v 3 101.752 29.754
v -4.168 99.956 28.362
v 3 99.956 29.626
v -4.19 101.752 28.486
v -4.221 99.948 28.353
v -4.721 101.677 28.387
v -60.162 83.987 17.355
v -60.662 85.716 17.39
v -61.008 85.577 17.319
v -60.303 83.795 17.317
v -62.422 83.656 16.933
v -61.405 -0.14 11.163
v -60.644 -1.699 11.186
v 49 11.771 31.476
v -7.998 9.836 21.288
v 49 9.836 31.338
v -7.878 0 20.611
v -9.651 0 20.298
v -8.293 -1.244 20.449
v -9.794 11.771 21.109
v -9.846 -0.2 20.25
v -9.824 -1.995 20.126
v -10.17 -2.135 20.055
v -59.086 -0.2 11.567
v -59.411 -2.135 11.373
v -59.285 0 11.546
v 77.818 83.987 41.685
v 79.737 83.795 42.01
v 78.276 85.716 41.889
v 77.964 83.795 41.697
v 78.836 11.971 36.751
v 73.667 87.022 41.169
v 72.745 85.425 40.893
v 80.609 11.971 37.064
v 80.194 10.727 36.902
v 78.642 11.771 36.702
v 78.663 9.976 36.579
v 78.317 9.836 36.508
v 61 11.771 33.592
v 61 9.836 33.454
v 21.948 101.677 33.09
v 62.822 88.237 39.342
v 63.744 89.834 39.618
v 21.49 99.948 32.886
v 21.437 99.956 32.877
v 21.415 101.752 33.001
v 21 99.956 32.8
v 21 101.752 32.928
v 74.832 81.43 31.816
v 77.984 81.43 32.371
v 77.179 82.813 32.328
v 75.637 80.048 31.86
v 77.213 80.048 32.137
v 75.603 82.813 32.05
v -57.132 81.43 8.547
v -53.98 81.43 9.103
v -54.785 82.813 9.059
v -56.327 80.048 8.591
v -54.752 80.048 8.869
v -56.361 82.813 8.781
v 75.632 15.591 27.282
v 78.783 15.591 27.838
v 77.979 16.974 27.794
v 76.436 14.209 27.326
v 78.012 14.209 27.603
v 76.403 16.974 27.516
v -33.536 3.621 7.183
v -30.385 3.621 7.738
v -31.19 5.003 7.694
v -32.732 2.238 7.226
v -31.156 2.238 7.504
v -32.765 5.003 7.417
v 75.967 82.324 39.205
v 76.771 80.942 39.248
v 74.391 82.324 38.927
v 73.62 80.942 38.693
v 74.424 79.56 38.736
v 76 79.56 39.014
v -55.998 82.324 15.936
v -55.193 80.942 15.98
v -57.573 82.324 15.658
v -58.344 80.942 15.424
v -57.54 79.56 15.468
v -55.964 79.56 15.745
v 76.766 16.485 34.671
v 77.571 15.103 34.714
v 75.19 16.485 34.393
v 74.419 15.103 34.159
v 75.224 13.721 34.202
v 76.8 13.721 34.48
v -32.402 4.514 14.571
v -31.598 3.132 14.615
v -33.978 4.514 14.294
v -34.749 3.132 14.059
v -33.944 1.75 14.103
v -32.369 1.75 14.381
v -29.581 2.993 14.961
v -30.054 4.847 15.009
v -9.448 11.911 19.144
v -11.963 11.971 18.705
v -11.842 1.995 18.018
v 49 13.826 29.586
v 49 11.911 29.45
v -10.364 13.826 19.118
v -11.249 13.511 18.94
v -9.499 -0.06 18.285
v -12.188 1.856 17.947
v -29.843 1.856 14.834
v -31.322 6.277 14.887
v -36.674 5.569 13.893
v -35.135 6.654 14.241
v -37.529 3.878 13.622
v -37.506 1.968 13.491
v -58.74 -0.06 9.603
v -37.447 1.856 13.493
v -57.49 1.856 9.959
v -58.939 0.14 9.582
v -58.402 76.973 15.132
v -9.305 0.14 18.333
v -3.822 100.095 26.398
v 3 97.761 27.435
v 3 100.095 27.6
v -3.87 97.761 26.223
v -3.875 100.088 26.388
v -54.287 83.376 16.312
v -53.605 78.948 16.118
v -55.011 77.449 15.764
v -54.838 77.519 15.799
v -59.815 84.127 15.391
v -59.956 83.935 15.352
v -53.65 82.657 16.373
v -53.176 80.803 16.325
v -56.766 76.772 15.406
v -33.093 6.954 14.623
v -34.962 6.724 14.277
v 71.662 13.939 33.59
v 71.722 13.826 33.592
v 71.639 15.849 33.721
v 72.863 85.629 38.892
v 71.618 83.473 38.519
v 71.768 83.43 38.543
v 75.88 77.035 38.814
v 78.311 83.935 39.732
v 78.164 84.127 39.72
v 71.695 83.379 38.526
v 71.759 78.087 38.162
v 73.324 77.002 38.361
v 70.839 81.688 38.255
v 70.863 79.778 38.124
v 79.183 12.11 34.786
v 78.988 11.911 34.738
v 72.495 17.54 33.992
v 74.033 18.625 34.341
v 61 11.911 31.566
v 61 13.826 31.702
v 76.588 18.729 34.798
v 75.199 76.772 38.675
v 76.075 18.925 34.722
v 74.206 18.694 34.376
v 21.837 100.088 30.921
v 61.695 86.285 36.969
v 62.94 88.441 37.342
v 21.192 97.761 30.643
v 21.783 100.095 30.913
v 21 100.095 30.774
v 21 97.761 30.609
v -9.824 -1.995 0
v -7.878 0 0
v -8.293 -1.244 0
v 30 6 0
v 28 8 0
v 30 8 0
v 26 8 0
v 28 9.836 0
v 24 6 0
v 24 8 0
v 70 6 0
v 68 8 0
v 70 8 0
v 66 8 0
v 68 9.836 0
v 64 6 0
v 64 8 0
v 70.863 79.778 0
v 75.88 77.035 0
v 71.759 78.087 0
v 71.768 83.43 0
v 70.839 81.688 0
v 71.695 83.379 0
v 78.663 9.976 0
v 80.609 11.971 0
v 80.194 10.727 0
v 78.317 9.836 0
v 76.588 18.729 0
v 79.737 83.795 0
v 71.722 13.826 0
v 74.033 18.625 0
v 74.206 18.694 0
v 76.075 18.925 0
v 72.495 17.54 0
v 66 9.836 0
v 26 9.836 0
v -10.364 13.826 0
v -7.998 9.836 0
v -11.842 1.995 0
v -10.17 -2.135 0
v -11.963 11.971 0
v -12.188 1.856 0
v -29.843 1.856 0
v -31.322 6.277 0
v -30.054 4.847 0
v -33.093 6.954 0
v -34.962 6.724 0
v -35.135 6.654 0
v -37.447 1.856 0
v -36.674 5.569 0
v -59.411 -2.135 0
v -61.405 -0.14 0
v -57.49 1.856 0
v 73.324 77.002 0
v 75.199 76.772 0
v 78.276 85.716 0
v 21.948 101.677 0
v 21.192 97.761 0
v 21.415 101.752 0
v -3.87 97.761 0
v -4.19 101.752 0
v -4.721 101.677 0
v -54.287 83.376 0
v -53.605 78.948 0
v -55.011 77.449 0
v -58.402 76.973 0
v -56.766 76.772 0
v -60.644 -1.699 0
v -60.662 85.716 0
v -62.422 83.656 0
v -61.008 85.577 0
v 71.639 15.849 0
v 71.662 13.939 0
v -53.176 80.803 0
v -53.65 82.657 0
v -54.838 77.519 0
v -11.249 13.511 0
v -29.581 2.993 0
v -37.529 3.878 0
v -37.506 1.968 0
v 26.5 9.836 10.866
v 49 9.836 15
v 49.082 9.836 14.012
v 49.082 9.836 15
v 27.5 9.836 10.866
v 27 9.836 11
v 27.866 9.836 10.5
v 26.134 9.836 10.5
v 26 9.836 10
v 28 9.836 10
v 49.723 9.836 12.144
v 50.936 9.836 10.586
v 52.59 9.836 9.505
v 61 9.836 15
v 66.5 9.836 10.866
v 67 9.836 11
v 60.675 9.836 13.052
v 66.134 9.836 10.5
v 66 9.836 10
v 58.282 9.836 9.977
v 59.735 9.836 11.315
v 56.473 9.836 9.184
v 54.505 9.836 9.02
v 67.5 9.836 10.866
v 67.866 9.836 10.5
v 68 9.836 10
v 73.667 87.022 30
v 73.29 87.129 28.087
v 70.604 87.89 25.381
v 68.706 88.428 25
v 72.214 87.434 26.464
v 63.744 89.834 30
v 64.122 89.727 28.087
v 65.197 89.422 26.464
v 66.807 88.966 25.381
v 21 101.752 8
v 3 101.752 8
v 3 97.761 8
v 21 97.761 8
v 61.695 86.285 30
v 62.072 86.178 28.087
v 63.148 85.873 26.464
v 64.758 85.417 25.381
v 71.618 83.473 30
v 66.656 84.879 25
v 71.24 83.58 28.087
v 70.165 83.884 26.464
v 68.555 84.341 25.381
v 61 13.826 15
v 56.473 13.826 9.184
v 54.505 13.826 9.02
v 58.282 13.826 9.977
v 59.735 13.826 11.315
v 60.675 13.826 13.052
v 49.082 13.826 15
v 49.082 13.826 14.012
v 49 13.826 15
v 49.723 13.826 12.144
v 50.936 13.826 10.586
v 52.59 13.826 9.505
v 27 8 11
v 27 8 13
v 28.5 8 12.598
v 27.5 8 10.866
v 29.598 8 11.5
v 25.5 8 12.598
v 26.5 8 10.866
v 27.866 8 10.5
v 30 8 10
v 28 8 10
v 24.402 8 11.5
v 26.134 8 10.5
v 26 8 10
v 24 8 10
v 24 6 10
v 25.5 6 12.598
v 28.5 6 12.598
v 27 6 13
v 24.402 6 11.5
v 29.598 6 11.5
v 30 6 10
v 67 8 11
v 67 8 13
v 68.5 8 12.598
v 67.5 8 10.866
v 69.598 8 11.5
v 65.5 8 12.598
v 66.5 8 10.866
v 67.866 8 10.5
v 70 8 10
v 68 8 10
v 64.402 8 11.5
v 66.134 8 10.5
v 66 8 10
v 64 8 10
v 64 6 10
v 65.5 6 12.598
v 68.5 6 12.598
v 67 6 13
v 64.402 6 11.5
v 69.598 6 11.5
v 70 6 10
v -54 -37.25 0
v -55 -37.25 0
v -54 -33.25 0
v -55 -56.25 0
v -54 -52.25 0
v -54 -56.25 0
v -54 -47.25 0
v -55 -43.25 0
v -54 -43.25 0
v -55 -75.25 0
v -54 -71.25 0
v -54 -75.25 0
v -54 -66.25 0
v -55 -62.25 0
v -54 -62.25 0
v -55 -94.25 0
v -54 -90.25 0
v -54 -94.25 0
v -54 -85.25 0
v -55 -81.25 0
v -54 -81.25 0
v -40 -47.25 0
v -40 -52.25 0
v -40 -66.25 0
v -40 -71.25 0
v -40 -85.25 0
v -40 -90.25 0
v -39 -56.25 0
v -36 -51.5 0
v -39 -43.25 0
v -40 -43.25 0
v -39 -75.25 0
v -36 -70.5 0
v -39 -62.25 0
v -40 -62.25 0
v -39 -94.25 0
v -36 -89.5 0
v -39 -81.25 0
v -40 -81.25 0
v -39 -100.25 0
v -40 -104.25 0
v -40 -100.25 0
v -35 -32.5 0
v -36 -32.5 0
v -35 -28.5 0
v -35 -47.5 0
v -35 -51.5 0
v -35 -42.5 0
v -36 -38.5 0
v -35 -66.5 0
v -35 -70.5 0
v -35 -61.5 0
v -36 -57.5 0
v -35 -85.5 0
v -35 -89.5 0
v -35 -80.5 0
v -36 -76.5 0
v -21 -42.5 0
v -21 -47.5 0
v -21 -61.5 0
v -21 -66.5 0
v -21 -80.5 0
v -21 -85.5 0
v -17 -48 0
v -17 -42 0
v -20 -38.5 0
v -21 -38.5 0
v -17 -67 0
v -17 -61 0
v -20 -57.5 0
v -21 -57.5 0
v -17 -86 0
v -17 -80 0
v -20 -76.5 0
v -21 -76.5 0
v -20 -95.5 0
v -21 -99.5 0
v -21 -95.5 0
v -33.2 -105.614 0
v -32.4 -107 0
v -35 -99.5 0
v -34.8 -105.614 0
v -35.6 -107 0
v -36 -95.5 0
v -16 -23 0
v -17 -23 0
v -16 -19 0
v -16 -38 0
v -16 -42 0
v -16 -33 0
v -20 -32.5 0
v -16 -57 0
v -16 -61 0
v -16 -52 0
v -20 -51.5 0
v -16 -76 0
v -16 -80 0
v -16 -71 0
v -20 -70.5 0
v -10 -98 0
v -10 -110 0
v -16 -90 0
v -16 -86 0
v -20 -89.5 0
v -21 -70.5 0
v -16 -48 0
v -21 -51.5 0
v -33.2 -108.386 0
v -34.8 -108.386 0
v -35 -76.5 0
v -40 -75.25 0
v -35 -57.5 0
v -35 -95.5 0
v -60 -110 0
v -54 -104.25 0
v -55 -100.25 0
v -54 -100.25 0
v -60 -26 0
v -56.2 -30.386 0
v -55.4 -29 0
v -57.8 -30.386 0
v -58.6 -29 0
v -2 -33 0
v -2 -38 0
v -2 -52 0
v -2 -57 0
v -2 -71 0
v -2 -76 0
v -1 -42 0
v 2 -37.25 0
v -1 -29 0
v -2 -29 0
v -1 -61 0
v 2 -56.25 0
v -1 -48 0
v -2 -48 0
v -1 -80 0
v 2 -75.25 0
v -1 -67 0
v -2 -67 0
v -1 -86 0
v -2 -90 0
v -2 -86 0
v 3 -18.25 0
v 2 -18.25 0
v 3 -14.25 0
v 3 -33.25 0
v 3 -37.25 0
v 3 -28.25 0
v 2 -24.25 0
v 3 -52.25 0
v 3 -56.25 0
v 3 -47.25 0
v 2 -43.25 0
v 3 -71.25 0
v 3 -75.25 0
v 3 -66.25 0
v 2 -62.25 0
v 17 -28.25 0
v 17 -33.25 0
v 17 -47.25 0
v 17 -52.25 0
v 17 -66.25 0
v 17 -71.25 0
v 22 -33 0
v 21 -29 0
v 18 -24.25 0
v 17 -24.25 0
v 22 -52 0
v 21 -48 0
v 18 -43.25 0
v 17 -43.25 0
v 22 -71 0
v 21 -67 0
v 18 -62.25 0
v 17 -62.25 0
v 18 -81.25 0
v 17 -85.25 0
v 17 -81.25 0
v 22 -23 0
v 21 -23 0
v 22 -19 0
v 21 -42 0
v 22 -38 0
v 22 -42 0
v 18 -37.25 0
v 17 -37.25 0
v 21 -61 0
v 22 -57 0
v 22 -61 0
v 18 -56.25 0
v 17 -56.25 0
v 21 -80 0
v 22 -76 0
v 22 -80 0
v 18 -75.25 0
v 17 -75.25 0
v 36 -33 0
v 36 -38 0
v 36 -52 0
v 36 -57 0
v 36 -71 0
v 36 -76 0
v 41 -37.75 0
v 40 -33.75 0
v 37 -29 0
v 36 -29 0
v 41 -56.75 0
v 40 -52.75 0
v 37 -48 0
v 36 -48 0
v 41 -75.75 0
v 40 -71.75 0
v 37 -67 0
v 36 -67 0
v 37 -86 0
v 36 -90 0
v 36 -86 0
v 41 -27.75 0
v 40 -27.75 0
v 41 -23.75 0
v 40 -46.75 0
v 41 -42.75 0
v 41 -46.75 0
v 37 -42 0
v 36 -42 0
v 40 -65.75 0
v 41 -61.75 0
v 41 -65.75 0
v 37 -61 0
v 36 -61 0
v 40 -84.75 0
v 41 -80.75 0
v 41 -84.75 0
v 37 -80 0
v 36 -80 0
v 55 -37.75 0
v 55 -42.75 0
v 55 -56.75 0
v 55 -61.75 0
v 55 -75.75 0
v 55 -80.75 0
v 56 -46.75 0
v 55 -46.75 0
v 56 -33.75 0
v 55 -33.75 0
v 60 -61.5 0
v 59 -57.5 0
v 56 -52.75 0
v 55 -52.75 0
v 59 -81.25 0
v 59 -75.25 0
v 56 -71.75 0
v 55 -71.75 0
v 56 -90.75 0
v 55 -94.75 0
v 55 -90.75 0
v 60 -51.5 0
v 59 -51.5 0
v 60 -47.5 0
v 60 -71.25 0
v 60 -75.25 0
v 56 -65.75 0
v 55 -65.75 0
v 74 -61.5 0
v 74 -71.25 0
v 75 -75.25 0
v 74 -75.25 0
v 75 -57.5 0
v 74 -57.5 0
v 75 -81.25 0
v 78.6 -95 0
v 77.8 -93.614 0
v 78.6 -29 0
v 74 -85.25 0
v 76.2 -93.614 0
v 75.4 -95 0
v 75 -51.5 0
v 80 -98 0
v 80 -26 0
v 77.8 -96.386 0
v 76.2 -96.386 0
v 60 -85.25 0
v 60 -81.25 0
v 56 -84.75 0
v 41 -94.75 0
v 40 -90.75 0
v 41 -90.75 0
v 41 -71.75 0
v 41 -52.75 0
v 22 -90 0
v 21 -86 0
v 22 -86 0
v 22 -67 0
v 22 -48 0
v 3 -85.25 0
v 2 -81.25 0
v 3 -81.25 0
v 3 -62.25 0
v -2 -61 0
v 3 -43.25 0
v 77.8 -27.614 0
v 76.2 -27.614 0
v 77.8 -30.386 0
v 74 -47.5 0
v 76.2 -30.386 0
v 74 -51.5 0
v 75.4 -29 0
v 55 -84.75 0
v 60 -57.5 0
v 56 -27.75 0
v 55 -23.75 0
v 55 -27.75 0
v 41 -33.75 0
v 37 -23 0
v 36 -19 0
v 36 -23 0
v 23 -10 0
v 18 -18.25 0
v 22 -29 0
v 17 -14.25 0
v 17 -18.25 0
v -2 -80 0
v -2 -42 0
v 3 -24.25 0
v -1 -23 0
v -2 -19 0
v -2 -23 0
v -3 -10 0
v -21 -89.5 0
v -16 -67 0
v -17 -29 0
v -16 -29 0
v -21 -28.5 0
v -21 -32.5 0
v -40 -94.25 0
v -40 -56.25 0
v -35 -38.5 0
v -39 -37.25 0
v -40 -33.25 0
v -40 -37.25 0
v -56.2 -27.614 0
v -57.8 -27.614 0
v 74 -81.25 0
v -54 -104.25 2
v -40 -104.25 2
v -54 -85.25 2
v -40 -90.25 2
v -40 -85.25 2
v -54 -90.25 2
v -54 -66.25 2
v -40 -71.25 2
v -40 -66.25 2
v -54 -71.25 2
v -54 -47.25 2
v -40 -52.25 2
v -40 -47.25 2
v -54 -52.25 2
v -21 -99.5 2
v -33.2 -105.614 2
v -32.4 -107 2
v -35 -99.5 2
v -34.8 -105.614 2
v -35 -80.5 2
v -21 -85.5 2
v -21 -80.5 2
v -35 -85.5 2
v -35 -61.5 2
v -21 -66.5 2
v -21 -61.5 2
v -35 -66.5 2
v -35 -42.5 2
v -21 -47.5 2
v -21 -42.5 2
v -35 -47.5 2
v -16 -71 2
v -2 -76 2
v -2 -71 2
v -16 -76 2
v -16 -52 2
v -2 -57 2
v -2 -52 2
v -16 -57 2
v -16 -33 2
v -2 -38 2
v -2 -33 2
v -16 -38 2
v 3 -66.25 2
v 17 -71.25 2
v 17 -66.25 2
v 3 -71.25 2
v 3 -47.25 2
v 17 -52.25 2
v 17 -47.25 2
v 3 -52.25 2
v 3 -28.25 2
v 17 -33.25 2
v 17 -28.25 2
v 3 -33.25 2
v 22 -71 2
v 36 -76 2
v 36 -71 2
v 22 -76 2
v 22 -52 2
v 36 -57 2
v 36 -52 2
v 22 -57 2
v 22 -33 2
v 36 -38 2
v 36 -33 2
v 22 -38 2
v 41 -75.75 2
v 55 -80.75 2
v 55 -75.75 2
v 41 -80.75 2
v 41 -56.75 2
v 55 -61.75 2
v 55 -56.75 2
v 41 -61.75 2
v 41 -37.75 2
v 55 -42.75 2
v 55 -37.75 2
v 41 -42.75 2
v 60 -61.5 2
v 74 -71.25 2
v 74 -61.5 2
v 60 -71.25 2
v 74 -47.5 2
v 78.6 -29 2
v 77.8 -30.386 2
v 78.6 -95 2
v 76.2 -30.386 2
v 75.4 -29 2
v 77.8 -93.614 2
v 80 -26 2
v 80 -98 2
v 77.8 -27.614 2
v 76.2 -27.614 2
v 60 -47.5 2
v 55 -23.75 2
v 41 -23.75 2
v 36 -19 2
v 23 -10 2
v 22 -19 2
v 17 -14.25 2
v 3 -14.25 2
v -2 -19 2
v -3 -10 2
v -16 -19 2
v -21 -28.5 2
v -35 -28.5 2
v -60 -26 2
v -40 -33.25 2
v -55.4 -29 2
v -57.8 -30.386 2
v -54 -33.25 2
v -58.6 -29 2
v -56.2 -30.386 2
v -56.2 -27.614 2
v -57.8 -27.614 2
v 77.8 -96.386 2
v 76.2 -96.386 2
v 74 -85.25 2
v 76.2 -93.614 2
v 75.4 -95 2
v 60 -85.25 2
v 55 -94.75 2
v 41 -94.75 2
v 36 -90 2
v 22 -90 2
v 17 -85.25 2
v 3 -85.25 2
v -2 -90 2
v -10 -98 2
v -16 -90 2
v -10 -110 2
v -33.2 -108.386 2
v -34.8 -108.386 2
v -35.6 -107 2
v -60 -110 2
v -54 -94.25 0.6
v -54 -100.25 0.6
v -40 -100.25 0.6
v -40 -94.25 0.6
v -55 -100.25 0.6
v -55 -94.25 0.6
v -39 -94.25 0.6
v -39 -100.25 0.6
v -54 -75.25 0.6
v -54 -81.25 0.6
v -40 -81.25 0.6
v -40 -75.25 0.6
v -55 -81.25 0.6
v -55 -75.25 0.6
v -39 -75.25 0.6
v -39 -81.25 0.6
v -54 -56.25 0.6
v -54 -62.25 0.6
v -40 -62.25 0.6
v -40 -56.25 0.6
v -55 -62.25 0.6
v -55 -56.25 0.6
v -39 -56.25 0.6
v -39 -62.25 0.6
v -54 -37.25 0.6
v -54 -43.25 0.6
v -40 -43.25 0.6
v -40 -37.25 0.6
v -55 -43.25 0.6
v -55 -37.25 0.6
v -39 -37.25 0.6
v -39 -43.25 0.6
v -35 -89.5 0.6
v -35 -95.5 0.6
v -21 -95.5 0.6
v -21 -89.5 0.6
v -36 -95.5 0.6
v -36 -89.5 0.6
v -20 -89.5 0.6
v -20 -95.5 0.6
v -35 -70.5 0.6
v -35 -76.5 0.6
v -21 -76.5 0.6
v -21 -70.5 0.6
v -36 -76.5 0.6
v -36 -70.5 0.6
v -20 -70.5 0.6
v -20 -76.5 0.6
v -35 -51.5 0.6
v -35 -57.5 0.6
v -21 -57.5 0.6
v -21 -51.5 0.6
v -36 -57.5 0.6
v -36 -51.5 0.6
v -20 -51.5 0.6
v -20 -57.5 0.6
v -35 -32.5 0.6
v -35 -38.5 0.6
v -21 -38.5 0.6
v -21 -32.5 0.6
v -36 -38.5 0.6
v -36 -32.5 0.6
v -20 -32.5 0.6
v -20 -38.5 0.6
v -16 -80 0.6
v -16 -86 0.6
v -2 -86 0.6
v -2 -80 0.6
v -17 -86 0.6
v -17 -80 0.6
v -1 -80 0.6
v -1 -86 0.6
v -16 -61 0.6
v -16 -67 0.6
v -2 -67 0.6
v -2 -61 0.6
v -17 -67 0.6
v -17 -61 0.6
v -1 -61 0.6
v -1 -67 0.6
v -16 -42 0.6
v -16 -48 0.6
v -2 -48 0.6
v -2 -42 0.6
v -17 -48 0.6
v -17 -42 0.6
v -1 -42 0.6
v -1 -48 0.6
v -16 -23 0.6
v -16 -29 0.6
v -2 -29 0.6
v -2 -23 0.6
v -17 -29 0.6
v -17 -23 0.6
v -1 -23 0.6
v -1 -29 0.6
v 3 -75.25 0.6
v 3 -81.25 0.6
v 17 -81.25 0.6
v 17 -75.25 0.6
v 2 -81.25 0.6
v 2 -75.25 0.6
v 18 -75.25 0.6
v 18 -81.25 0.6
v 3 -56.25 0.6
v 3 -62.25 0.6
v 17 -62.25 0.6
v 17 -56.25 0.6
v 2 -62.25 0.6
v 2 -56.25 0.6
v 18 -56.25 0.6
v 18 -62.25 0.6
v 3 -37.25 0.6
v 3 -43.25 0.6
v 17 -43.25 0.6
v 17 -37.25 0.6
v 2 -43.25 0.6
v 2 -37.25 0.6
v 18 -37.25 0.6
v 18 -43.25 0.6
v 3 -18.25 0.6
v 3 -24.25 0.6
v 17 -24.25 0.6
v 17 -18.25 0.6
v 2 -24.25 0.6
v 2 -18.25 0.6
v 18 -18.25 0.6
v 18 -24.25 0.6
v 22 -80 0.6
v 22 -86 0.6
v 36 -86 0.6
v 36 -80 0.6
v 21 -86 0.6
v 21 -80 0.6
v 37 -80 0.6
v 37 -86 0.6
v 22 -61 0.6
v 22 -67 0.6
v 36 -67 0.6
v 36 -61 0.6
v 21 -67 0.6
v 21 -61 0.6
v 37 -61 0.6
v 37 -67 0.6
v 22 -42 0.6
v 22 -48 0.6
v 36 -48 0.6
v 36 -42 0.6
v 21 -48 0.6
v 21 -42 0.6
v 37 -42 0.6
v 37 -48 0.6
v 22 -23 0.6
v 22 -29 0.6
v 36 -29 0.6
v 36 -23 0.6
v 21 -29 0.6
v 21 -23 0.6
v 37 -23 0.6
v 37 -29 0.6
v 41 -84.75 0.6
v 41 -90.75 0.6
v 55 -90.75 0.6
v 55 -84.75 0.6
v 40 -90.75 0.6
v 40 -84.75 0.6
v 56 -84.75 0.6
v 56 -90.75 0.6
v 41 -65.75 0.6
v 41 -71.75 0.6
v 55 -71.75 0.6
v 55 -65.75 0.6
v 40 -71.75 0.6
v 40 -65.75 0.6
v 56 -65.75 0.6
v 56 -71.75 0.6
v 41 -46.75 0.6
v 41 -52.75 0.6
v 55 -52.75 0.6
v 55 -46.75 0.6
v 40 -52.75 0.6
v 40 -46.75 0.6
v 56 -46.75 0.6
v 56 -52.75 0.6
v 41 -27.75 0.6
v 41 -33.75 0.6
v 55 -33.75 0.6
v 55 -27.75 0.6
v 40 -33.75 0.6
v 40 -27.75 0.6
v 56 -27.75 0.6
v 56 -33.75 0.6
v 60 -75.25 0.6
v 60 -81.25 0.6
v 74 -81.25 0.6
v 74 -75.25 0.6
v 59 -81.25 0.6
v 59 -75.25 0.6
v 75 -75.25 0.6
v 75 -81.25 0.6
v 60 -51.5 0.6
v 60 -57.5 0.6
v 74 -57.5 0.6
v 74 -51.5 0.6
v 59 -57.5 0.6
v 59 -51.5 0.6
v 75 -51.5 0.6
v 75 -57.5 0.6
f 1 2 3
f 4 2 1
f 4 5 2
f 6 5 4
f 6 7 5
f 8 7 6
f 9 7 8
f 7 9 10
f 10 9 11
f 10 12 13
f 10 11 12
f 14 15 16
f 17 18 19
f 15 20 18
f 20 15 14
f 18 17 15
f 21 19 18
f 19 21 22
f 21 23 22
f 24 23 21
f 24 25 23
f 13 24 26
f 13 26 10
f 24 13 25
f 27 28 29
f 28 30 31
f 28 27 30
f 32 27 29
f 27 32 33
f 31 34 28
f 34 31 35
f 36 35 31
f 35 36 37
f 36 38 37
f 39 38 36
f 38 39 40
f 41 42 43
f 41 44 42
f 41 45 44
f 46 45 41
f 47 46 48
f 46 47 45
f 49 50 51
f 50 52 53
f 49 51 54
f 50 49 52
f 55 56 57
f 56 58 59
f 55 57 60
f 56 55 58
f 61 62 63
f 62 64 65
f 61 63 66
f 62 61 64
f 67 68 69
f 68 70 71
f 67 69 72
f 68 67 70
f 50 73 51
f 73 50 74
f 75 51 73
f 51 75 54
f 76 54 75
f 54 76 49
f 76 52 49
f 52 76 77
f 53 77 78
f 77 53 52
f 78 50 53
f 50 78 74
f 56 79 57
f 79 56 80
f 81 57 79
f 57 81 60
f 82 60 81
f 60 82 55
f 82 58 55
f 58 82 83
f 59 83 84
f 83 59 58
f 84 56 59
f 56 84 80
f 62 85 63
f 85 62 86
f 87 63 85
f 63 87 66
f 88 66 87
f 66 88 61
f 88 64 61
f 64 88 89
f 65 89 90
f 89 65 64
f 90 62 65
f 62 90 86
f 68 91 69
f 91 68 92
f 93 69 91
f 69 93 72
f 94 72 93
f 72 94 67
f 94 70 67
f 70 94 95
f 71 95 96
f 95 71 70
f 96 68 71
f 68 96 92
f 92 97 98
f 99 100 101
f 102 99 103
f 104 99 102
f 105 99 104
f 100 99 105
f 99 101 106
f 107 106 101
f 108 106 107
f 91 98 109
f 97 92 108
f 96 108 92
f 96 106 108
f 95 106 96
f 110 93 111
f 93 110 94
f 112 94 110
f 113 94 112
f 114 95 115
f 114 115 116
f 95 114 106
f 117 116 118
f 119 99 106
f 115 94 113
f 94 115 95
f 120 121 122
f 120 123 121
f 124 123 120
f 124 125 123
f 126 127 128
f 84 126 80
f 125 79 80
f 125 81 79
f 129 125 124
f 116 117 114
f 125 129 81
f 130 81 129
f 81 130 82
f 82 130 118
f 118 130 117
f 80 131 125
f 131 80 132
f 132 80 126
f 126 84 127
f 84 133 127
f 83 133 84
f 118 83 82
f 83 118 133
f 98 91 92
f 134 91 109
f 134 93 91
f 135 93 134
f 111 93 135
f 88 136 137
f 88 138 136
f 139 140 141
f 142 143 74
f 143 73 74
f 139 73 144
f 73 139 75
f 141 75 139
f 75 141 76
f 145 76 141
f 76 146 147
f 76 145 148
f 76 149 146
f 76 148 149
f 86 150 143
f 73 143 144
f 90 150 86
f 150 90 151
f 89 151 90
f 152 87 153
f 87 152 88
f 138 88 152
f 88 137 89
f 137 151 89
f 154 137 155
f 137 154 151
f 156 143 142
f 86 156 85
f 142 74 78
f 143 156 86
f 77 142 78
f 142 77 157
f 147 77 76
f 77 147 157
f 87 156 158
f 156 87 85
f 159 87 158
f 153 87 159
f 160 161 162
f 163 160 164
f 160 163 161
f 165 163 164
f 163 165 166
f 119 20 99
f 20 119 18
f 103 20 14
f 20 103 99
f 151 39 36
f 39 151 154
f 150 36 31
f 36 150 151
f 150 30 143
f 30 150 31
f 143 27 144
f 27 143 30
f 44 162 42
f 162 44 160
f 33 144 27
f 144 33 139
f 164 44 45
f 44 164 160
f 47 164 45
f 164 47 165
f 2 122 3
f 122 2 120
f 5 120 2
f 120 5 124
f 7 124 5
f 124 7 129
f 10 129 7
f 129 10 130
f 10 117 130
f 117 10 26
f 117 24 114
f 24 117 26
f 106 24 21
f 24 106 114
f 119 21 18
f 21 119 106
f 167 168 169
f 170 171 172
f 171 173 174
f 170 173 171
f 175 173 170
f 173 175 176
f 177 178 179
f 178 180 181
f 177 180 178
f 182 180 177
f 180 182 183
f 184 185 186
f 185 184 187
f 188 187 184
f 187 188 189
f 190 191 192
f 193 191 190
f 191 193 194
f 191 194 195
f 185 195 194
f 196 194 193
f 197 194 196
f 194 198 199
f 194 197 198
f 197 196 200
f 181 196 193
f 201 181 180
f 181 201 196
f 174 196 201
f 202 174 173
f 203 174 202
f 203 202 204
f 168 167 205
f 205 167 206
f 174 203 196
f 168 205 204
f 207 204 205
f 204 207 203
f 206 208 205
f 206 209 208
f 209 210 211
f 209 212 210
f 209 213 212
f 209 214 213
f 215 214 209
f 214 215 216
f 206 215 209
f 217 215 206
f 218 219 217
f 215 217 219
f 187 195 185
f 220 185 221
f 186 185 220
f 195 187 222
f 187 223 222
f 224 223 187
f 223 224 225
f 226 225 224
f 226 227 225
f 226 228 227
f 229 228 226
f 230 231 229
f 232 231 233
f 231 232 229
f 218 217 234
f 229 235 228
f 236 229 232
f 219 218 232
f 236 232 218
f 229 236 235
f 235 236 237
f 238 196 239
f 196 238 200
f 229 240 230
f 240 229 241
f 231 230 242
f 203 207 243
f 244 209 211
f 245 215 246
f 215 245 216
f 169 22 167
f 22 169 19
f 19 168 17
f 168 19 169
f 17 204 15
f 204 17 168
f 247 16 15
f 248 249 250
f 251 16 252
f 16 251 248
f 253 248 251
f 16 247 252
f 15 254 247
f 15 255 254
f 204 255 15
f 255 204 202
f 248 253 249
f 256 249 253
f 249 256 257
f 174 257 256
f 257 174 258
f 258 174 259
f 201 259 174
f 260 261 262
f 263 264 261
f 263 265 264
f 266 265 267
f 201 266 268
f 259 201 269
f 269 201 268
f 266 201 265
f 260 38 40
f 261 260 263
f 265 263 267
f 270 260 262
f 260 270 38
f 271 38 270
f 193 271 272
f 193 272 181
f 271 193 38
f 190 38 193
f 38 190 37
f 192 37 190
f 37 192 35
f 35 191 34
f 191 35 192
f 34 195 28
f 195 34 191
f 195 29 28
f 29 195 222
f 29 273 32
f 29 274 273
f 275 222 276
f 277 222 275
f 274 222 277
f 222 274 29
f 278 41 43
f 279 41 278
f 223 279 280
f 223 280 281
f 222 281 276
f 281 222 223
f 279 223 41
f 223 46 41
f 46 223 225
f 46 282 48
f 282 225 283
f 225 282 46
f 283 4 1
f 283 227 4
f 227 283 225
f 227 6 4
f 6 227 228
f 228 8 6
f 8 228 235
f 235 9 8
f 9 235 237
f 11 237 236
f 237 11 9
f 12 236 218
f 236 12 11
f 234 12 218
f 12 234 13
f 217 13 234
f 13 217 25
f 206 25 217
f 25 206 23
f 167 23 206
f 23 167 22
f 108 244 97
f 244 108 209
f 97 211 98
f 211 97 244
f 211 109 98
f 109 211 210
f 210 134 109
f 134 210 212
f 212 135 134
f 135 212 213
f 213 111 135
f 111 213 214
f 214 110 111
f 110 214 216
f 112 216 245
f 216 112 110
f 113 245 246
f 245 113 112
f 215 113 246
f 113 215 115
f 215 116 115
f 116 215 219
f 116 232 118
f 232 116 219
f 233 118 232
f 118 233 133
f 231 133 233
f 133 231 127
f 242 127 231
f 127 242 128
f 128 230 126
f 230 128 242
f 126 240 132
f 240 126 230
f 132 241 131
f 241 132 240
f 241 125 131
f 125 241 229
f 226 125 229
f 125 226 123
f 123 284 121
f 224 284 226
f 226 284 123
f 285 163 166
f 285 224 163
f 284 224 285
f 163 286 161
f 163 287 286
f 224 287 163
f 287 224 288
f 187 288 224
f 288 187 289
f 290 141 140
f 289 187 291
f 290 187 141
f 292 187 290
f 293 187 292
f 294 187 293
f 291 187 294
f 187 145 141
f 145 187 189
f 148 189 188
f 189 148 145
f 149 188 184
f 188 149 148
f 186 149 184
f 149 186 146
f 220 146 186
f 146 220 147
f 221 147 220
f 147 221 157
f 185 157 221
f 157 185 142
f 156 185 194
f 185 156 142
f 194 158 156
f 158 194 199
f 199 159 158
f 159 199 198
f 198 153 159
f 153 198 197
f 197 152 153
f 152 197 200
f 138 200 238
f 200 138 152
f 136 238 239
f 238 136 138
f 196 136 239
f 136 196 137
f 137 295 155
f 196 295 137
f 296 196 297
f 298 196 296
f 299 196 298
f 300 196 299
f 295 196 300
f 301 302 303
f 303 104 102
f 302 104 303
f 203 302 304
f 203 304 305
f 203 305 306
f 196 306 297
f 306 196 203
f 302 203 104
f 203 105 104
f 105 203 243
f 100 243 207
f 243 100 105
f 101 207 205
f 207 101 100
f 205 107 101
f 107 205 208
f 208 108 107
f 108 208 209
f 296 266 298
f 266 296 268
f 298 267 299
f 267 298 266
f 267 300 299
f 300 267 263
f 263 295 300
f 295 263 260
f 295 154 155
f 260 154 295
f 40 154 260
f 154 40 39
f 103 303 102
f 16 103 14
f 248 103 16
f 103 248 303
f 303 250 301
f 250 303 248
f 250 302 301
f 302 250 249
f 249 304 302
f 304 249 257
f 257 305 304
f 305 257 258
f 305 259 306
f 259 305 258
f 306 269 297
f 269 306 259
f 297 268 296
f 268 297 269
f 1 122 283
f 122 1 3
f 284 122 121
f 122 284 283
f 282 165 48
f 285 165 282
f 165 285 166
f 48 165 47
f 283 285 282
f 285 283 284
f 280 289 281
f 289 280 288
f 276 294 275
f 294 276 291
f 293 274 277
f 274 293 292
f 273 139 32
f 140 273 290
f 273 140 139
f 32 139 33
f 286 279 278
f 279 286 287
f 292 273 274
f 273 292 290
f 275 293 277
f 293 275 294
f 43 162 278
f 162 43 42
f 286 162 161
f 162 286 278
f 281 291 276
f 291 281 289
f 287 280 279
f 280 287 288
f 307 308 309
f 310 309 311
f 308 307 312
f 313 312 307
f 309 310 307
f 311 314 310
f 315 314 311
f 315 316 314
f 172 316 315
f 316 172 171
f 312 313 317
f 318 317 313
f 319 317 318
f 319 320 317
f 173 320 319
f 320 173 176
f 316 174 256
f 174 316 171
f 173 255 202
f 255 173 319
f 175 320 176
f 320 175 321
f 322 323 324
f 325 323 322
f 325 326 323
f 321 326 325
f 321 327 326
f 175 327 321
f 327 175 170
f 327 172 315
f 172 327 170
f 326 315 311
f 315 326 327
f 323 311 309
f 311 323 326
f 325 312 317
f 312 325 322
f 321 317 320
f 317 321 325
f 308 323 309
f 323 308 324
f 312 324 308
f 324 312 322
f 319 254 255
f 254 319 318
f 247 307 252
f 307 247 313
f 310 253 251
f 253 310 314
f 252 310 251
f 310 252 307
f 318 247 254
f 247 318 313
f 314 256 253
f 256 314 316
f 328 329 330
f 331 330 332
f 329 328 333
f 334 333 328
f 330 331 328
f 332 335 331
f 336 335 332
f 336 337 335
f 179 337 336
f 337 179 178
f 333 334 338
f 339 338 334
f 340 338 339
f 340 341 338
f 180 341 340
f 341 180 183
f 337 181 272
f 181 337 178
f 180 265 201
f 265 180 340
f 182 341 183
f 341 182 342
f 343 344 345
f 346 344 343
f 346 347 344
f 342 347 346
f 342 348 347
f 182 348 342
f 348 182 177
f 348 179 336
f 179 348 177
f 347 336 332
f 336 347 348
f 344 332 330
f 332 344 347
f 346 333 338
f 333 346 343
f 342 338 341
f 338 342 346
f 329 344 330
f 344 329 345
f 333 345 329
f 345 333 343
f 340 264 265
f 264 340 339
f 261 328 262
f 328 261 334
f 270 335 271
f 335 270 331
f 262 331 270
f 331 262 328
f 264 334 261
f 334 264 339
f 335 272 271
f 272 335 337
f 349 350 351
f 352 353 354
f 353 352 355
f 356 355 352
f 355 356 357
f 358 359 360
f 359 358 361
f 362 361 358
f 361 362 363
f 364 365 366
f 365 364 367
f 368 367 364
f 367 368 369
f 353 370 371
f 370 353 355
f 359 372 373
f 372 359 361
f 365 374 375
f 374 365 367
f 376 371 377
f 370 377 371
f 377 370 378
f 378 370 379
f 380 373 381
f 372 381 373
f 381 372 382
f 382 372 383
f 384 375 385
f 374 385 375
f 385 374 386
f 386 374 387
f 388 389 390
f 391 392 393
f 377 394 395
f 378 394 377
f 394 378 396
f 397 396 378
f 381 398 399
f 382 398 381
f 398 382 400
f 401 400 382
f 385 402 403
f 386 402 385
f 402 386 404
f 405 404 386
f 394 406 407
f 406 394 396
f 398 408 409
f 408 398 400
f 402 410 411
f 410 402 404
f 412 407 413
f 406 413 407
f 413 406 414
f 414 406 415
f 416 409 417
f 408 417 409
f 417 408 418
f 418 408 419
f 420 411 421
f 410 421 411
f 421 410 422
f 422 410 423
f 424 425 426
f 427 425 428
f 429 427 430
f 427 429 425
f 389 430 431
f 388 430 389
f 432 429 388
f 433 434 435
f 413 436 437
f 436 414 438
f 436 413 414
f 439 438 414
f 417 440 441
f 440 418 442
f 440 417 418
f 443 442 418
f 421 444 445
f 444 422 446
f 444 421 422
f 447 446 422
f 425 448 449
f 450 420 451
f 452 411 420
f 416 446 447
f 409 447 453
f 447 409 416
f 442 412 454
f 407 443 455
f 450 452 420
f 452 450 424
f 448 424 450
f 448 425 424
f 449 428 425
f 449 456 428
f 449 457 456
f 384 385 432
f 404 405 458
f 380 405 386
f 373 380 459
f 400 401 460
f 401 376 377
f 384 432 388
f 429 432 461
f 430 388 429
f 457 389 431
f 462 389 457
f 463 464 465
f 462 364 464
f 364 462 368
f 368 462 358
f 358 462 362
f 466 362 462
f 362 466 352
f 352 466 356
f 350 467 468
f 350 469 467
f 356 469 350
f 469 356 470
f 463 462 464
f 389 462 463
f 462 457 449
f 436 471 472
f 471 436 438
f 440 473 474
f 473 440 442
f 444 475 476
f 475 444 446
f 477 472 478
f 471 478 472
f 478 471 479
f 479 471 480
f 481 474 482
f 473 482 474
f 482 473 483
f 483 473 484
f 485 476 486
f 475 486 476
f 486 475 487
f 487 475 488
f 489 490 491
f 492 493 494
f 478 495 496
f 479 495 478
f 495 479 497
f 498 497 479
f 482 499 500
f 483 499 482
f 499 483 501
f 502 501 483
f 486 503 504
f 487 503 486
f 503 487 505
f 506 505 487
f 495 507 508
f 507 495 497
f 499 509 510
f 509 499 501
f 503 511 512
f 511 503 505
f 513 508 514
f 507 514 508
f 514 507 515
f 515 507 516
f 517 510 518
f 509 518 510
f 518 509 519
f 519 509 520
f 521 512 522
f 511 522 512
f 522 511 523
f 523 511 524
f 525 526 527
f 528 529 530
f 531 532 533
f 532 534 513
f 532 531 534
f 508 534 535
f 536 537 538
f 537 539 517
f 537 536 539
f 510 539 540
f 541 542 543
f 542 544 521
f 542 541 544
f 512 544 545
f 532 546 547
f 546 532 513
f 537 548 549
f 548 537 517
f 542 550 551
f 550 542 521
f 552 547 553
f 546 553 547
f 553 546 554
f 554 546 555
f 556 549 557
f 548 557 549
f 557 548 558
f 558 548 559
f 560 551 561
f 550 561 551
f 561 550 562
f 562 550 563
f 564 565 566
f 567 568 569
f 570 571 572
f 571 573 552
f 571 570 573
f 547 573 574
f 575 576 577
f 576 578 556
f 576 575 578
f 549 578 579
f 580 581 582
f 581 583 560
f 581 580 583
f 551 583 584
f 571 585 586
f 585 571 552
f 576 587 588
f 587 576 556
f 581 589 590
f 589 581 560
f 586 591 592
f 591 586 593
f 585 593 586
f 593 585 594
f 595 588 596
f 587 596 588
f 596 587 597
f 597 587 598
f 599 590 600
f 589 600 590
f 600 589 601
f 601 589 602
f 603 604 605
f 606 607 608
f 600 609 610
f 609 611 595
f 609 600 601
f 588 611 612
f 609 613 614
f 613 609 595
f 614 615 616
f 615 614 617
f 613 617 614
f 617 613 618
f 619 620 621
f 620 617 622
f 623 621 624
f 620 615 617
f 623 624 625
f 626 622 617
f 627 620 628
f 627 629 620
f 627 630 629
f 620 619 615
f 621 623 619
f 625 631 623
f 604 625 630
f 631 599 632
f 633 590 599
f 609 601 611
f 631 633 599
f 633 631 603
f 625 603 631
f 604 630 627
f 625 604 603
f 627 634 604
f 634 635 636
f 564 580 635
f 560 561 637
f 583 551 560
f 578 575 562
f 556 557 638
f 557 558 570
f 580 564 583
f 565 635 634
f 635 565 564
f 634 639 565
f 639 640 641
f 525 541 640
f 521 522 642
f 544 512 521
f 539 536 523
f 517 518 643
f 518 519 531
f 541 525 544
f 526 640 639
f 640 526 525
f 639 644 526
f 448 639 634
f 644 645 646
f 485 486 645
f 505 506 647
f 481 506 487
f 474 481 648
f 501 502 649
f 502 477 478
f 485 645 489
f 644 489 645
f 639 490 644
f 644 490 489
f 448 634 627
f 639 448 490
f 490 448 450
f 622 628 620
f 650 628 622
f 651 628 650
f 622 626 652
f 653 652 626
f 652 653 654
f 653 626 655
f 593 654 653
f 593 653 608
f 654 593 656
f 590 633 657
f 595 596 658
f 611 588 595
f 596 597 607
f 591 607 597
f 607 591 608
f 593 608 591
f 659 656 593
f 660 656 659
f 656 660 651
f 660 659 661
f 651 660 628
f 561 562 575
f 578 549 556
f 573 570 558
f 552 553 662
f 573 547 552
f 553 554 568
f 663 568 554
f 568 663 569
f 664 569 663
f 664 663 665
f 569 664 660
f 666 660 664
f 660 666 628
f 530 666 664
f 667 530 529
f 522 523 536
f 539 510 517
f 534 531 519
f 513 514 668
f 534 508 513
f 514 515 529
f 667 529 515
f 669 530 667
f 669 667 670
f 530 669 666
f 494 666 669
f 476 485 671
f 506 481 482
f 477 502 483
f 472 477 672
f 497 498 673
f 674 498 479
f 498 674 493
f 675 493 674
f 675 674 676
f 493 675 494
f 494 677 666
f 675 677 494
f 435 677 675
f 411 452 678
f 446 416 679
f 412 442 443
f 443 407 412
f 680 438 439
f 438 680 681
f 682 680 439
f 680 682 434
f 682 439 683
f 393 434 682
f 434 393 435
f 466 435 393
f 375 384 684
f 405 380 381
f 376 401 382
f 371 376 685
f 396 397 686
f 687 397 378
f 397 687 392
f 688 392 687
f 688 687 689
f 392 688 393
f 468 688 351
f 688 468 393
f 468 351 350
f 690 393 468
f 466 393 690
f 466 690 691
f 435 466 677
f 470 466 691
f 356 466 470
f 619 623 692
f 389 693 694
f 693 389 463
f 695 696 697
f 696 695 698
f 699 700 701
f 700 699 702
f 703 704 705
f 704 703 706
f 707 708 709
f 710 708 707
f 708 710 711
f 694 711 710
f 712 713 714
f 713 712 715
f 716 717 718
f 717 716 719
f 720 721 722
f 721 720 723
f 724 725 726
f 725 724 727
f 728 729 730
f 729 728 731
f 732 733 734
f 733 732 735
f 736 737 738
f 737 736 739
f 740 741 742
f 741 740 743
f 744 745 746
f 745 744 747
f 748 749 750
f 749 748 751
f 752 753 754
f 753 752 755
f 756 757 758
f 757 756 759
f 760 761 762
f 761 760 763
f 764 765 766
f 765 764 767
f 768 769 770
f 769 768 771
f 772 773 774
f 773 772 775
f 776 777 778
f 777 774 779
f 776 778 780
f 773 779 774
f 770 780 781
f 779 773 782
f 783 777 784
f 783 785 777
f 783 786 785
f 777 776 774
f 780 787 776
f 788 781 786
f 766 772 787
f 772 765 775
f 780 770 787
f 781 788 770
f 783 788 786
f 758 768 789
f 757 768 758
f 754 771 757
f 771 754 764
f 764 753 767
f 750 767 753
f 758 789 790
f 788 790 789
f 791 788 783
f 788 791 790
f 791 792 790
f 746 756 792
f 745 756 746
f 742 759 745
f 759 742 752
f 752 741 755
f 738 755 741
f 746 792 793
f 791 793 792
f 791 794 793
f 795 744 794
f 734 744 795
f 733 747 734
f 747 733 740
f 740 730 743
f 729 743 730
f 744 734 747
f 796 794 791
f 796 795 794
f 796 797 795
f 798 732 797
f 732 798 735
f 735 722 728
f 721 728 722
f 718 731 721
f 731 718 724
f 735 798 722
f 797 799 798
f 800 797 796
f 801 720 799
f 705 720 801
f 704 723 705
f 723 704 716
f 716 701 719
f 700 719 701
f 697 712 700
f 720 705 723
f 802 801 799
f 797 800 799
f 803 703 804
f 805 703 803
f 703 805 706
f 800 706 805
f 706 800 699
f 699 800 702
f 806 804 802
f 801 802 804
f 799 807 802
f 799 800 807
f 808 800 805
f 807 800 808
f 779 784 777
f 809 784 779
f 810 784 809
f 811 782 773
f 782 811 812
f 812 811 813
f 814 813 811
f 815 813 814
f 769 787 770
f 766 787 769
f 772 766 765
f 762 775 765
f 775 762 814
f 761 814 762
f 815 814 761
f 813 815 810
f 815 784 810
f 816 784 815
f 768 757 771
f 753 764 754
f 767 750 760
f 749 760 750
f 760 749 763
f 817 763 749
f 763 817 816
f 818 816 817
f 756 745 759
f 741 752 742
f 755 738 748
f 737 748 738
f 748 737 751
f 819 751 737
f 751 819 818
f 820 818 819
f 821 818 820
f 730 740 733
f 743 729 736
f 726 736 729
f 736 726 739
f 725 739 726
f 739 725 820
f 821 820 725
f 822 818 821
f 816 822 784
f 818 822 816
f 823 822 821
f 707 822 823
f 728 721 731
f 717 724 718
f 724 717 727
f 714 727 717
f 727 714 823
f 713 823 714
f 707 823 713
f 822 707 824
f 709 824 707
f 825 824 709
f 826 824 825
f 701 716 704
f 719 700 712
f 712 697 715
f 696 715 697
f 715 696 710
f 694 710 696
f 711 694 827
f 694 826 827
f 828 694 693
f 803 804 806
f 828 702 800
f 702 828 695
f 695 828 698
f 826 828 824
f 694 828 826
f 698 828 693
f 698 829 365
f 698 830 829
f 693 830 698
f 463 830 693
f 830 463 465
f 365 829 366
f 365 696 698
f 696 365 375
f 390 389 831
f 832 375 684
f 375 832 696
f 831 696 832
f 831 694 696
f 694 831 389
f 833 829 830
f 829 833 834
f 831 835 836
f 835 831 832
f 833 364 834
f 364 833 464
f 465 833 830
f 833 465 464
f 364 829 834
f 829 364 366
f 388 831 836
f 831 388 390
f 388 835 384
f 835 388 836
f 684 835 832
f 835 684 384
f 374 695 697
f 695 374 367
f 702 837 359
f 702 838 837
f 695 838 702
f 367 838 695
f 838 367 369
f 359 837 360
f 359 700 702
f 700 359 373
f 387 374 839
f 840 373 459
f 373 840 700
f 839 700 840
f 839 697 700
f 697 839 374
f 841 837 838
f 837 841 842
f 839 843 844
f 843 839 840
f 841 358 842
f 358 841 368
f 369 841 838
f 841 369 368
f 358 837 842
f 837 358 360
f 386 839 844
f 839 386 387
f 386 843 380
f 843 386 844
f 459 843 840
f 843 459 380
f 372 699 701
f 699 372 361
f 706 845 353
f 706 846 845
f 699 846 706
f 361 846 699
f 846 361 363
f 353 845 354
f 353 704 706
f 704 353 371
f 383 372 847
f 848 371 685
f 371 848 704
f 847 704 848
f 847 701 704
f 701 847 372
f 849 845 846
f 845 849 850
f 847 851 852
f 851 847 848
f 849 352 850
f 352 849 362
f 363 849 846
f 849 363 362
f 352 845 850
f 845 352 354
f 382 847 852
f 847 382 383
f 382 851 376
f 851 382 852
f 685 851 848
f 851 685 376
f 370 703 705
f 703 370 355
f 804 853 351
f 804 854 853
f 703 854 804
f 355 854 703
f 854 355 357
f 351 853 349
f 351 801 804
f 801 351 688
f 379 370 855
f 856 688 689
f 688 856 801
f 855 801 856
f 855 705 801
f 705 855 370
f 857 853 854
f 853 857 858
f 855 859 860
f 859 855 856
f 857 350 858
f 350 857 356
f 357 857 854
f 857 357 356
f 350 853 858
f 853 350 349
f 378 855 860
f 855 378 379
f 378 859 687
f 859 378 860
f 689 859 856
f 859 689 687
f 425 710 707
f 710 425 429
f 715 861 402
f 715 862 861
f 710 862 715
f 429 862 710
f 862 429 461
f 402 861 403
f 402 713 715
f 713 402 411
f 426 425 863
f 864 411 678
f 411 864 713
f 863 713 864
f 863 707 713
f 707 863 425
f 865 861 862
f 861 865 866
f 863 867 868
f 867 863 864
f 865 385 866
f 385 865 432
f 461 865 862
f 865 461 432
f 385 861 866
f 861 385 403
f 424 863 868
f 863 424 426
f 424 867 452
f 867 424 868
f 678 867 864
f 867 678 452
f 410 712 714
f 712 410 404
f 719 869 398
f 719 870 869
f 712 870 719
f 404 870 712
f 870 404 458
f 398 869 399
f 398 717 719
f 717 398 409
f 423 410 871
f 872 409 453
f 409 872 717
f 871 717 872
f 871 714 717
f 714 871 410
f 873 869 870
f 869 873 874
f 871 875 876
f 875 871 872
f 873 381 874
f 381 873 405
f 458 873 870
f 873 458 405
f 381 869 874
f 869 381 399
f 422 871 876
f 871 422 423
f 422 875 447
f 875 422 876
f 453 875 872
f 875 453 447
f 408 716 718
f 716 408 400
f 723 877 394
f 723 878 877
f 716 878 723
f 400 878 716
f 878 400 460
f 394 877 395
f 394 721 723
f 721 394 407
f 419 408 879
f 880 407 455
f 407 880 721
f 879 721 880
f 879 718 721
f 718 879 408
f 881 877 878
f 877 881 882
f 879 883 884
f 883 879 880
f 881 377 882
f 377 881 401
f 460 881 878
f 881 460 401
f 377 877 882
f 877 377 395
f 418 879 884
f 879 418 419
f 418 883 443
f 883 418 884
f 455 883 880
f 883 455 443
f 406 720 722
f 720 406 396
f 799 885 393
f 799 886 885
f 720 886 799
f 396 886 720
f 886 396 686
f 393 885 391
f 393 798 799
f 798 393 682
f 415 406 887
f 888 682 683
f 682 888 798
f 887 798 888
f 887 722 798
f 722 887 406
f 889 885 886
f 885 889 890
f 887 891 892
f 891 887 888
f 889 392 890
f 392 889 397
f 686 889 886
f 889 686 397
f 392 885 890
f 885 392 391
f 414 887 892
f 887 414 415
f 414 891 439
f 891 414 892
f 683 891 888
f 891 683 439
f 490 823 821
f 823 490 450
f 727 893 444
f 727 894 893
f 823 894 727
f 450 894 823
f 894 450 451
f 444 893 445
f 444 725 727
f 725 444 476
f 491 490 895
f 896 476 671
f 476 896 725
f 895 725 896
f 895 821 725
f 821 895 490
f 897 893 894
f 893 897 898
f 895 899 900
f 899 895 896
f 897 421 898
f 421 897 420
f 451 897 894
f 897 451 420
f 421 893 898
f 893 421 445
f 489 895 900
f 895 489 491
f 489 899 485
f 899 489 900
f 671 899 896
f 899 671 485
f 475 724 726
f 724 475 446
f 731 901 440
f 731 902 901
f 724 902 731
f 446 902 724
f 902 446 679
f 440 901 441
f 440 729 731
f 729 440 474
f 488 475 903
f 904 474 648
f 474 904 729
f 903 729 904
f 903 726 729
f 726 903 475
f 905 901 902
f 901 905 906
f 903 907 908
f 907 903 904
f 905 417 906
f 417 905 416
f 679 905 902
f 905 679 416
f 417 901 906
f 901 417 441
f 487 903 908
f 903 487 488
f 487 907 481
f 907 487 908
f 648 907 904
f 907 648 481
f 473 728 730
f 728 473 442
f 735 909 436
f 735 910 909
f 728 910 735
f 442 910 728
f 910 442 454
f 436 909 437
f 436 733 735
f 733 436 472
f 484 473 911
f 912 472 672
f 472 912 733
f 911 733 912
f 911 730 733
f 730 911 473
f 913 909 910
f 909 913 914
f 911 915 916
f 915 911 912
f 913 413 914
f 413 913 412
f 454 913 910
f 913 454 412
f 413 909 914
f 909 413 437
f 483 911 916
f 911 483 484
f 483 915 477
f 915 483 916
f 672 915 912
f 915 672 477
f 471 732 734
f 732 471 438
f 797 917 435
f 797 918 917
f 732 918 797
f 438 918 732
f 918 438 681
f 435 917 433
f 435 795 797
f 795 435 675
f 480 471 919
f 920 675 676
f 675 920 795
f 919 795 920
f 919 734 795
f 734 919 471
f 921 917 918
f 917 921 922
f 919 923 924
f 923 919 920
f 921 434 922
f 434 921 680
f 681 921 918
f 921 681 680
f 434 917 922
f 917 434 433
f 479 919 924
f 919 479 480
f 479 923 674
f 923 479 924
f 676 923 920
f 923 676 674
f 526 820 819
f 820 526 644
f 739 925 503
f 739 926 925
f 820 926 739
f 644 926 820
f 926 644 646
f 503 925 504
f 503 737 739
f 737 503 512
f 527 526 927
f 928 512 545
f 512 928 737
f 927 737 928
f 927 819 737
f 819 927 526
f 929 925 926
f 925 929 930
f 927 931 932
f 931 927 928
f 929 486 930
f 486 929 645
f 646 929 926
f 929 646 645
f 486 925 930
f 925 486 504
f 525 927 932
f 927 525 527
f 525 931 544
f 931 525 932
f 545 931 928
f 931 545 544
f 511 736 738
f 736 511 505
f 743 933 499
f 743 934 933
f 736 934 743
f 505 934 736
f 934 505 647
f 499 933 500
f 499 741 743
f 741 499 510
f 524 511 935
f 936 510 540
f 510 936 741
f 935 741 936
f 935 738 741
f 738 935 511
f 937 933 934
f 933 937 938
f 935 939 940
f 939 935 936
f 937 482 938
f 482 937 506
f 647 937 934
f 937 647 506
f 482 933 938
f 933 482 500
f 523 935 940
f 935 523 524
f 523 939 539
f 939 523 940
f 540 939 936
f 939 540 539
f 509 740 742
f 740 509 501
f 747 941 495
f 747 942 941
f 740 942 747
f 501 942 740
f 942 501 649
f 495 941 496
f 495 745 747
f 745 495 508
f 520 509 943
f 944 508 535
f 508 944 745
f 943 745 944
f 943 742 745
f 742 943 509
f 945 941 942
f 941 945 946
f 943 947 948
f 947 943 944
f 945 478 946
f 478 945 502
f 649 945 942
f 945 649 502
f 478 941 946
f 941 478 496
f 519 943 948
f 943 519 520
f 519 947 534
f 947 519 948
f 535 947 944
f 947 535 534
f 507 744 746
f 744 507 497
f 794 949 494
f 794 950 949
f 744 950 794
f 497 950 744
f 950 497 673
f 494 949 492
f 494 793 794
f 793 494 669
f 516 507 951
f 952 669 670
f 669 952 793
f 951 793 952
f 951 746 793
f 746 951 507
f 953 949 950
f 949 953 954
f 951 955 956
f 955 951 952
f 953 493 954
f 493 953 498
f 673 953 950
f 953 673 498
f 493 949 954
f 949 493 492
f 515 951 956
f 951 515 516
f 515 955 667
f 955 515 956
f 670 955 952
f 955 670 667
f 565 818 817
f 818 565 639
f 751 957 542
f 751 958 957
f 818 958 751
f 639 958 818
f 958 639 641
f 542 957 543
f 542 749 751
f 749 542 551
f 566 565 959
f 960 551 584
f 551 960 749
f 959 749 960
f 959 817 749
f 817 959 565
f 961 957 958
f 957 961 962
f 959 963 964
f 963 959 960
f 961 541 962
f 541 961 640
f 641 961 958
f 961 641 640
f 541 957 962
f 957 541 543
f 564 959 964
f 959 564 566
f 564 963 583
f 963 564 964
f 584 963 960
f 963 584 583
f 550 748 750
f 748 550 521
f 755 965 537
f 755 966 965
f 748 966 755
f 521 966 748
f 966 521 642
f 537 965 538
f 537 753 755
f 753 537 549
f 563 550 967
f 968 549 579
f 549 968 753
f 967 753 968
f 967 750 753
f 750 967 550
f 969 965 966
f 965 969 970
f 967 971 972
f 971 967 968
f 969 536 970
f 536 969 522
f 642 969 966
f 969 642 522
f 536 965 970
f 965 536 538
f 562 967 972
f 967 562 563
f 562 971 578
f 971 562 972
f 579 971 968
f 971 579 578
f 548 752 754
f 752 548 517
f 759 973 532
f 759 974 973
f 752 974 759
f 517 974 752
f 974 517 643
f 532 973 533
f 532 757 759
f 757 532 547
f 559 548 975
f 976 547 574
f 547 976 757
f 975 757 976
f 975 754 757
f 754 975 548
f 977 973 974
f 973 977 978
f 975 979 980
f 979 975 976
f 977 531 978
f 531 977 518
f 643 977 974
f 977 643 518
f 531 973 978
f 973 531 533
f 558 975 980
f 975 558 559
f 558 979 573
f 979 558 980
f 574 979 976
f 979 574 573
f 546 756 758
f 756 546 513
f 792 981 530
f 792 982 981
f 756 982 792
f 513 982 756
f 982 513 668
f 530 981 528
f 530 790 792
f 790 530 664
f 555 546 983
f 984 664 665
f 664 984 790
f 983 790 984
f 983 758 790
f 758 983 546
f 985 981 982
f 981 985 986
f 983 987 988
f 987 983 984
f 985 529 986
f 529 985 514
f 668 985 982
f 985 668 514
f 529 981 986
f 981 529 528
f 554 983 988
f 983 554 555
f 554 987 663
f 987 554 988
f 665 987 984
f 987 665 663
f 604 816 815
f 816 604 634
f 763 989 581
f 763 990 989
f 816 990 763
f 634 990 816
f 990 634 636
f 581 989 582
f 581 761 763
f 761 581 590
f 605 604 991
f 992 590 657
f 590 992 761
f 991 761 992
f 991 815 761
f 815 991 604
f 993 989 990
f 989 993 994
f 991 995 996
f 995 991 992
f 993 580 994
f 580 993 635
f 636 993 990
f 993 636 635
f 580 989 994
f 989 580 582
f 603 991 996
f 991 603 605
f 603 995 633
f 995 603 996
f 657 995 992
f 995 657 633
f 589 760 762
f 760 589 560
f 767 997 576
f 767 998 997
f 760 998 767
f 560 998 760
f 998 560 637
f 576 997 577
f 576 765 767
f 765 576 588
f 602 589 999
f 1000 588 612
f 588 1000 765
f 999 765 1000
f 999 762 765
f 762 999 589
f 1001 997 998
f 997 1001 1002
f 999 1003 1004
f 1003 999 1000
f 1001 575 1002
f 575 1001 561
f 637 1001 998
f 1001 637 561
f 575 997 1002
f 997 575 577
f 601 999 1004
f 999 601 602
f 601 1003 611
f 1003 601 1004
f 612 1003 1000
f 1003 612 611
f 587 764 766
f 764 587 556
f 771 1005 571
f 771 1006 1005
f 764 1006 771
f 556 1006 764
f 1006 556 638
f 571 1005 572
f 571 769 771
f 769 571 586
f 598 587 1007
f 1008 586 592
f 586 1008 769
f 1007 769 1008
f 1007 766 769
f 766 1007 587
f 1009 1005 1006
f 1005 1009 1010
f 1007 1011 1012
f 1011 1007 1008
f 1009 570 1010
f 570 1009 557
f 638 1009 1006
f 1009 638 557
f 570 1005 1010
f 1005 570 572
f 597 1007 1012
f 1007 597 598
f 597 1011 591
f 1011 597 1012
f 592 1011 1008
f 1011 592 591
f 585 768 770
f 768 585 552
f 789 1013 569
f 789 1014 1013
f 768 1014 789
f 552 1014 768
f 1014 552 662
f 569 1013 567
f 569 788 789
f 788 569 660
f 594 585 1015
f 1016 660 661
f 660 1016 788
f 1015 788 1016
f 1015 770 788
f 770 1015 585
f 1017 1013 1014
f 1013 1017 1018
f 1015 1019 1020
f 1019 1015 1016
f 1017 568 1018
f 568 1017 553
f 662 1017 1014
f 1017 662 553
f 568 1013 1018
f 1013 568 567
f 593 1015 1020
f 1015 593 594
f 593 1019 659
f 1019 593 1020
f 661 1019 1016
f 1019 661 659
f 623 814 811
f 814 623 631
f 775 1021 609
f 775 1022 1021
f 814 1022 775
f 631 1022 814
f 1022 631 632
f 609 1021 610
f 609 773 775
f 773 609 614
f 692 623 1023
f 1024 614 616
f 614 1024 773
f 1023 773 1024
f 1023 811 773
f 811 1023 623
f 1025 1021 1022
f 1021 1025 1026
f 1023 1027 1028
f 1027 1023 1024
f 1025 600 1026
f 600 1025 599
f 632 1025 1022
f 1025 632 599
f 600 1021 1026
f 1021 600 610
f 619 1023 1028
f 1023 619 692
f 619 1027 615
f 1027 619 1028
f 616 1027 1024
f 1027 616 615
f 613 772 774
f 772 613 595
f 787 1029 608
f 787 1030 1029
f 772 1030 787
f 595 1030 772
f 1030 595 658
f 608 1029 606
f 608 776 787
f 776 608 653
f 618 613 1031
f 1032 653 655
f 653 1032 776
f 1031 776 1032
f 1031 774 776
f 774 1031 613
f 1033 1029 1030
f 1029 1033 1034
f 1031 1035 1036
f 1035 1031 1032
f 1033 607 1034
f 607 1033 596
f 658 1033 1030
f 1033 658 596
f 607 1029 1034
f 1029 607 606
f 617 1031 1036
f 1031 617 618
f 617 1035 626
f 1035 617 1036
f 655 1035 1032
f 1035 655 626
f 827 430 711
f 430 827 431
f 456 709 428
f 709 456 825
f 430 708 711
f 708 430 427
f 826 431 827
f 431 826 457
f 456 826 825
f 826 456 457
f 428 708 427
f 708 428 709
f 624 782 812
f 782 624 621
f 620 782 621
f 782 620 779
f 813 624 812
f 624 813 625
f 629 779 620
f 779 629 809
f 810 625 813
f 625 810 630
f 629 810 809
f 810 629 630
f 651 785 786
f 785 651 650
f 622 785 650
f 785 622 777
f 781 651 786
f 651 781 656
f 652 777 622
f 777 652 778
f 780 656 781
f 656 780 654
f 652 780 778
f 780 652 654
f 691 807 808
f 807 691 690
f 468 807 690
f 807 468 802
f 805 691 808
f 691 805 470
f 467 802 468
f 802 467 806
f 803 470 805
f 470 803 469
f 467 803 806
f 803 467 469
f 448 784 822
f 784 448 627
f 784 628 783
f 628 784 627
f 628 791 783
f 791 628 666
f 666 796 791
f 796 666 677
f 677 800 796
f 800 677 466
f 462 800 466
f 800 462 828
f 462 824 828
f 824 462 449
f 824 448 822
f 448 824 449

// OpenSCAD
// file: common.scad
module keyswitch_hole(x=0, y=0, a=0) {
    translate([x, y, 0]) {
        rotate([0, 0, 90+a]) {
            linear_extrude(height = 2) {
            square([14, 14], center = true);
            //translate([-8, 3, 0]) square([1, 3]);
            //translate([-8, -6, 0]) square([1, 3]);
            //translate([7, 3, 0]) square([1, 3]);
            //translate([7, -6, 0]) square([1, 3]);
            }
            linear_extrude(height = 0.6) {
                translate([-3, 7]) square([6, 1]);
            translate([-3, -8]) square([6, 1]);
            }
        }
    }
}

keyswitch_hole();

module joint_male_face() {
    translate([-1, 0])
    square([2,4]);
    translate([-3, 2])
    square([6,2]);
}

module joint_male(pos=[0,0]) {
    translate(pos){
      rotate([0,0,180]){
        linear_extrude(height=10)
        joint_male_face();
        
        translate([0,2,10])
        rotate([-90,0,0])
        linear_extrude(height=2)
        circle(3, $fn=12);
        
        translate([0,0,10])
        rotate([-90,0,0])
        linear_extrude(height=2)
        circle(1, $fn=12);
      }
    }
}

module joint_female(pos=[0,0]) {
    delta = 0.6;
    translate(pos){
      rotate([0,0,180]){
        linear_extrude(height=10)
        offset(delta=delta)
        joint_male_face();
        
        translate([0,1.6,10])
        rotate([-90,0,0])
        linear_extrude(height=2.8)
        offset(delta=delta)
        circle(3, $fn=12);

        translate([0,-0.4,10])
        rotate([-90,0,0])
        linear_extrude(height=2.8)
        offset(delta=delta)
        circle(1, $fn=12);
      }
    }
}


joint_male([20, 0]);
joint_female([30, 0]);
// main file
use <common.scad>;

UNIT = 19;
UNIT_H = UNIT / 2;
UNIT_Q = UNIT / 4;
UNIT_E = UNIT / 8;

KEY_OFFSET_X = 10;
KEY_OFFSET_Y = 8;

finger_plate_points = [
    [-60,0],
    [-10,0],
    [-10,12],
    [80, 12],
    [80, 84],
    [23, 100],
    [-3, 100],
    [-60, 84],
];

finger_plate_sc_points = [
    [-34, 3],
    [80-3, 12+3],
    [80-3, 84 - 3],
    [-60+3, 84 - 3],
];

module finger_plate_nohole() {
    linear_extrude(height = 2)
    polygon(points=finger_plate_points);
}

module keyswitch_col(x=0,y=0,c=3,a=0) {
    rotate([0, 0, a])
    for (i = [0:c-1]) {
        keyswitch_hole(x, y+19*i);
    }
}

module finger_plate_holes() {
    // G
    GX = KEY_OFFSET_X - UNIT * 3;
    GY = KEY_OFFSET_Y + UNIT_Q;
    echo("G: ", GX, GY);
    keyswitch_col(GX, GY, 4);
    // F
    FX = KEY_OFFSET_X- UNIT * 2;
    FY = KEY_OFFSET_Y + UNIT_H;
    echo("F: ", FX, FY);
    keyswitch_col(FX, FY, 4);
    // E
    EX = KEY_OFFSET_X - UNIT;
    EY = KEY_OFFSET_Y + UNIT_H + UNIT_Q + UNIT_Q;
    echo("E: ", EX, EY);
    keyswitch_col(EX, EY, 4);
    // D
    DX = KEY_OFFSET_X;
    DY = KEY_OFFSET_Y + UNIT + UNIT_Q;
    echo("D: ", DX, DY);
    keyswitch_col(DX, DY, 4);
    // C
    CX = KEY_OFFSET_X+ UNIT;
    CY = KEY_OFFSET_Y + UNIT;
    echo("C: ", CX, CY);
    keyswitch_col(CX, CY, 4);
    // B
    BX = KEY_OFFSET_X+UNIT * 2;
    BY = KEY_OFFSET_Y+ UNIT_H + UNIT_Q;
    echo("B: ", BX, BY);
    keyswitch_col(BX, BY, 4);
    // A
    AX = KEY_OFFSET_X+UNIT*3;
    AY = KEY_OFFSET_Y+UNIT + UNIT_Q;
    echo("A: ", AX, AY);
    keyswitch_col(AX, AY, 1);
    echo("A2: ", AX, AY + UNIT + UNIT_Q);
    keyswitch_col(AX, AY + UNIT + UNIT_Q, 1);  
    for(p=finger_plate_sc_points){
        linear_extrude(height=5)
            translate(p)
            circle(1.6);
    }
}

module finger_plate() {
    difference() {
        finger_plate_nohole();
        finger_plate_holes();
    }
}

//tilt_angle = [-5,-5,0];
tilt_angle = [4,-10,0];
tilt_angle_r = tilt_angle * -1;
echo(tilt_angle_r);

//height = 15;
height = 22;

module finger_case_outer_face() {
    projection()
        translate([0,0,height])
        rotate(tilt_angle)
        linear_extrude(height=2)
        offset(2)
        polygon(points=finger_plate_points);
}

module finger_case_inner_face() {
    projection()
        translate([0,0,height])
        rotate(tilt_angle)
        linear_extrude(height=2)
        offset(-2)
        polygon(points=finger_plate_points);
}

module finger_case_bottom_face() {
    difference() {
        finger_case_outer_face();
        finger_case_inner_face();
    }
    projection()
    translate([0,0,height])
    rotate(tilt_angle)
    for(p=finger_plate_sc_points){
        linear_extrude(height=1)
        translate(p)
        circle(4);
    }
}


module finger_case_nohole() {
    difference() {
        linear_extrude(height=50)
        finger_case_bottom_face();
    
        translate([0,0,height])
        rotate(tilt_angle){
            linear_extrude(height=50)
            square(300, center=true);
            // sc hole
            translate([0,0,-9])
            linear_extrude(height=9)
            for(p=finger_plate_sc_points){
                translate(p)
                circle(1.6);
            }
            // plate_hole
            translate([0,0,-2])
            linear_extrude(height=2)
            offset(0.2)
            polygon(points=finger_plate_points);
        }
    }
}

module finger_case_hole() {
    // cable hole
    translate([55,15,0])
    rotate([90,0,0])
    linear_extrude(height=20){
        translate([0, 15])
        circle(6);
        translate([-6,15])
        square([12, 30]);
    }
    // USB hole
    translate([12,110,0])
    rotate([90,0,0])
    linear_extrude(height=20) {
        //translate([0, 10])
        //circle(9);
        translate([-9, 8])
        square([18, 40]);
    }
    // TRRS hole
    translate([72.5,95,0])
    rotate([90,0,-30])
    linear_extrude(height=20) {
        translate([0, 30])
        circle(5);
        translate([-5, 30])
        square([10, 30]);
    }
}

module finger_case() {
    difference() {
        finger_case_nohole();
        finger_case_hole();
    }
    for (x = [27, 67]) {
        joint_male([x, 10]);
    }
}

finger_case();


translate([0,-110])
finger_plate();
